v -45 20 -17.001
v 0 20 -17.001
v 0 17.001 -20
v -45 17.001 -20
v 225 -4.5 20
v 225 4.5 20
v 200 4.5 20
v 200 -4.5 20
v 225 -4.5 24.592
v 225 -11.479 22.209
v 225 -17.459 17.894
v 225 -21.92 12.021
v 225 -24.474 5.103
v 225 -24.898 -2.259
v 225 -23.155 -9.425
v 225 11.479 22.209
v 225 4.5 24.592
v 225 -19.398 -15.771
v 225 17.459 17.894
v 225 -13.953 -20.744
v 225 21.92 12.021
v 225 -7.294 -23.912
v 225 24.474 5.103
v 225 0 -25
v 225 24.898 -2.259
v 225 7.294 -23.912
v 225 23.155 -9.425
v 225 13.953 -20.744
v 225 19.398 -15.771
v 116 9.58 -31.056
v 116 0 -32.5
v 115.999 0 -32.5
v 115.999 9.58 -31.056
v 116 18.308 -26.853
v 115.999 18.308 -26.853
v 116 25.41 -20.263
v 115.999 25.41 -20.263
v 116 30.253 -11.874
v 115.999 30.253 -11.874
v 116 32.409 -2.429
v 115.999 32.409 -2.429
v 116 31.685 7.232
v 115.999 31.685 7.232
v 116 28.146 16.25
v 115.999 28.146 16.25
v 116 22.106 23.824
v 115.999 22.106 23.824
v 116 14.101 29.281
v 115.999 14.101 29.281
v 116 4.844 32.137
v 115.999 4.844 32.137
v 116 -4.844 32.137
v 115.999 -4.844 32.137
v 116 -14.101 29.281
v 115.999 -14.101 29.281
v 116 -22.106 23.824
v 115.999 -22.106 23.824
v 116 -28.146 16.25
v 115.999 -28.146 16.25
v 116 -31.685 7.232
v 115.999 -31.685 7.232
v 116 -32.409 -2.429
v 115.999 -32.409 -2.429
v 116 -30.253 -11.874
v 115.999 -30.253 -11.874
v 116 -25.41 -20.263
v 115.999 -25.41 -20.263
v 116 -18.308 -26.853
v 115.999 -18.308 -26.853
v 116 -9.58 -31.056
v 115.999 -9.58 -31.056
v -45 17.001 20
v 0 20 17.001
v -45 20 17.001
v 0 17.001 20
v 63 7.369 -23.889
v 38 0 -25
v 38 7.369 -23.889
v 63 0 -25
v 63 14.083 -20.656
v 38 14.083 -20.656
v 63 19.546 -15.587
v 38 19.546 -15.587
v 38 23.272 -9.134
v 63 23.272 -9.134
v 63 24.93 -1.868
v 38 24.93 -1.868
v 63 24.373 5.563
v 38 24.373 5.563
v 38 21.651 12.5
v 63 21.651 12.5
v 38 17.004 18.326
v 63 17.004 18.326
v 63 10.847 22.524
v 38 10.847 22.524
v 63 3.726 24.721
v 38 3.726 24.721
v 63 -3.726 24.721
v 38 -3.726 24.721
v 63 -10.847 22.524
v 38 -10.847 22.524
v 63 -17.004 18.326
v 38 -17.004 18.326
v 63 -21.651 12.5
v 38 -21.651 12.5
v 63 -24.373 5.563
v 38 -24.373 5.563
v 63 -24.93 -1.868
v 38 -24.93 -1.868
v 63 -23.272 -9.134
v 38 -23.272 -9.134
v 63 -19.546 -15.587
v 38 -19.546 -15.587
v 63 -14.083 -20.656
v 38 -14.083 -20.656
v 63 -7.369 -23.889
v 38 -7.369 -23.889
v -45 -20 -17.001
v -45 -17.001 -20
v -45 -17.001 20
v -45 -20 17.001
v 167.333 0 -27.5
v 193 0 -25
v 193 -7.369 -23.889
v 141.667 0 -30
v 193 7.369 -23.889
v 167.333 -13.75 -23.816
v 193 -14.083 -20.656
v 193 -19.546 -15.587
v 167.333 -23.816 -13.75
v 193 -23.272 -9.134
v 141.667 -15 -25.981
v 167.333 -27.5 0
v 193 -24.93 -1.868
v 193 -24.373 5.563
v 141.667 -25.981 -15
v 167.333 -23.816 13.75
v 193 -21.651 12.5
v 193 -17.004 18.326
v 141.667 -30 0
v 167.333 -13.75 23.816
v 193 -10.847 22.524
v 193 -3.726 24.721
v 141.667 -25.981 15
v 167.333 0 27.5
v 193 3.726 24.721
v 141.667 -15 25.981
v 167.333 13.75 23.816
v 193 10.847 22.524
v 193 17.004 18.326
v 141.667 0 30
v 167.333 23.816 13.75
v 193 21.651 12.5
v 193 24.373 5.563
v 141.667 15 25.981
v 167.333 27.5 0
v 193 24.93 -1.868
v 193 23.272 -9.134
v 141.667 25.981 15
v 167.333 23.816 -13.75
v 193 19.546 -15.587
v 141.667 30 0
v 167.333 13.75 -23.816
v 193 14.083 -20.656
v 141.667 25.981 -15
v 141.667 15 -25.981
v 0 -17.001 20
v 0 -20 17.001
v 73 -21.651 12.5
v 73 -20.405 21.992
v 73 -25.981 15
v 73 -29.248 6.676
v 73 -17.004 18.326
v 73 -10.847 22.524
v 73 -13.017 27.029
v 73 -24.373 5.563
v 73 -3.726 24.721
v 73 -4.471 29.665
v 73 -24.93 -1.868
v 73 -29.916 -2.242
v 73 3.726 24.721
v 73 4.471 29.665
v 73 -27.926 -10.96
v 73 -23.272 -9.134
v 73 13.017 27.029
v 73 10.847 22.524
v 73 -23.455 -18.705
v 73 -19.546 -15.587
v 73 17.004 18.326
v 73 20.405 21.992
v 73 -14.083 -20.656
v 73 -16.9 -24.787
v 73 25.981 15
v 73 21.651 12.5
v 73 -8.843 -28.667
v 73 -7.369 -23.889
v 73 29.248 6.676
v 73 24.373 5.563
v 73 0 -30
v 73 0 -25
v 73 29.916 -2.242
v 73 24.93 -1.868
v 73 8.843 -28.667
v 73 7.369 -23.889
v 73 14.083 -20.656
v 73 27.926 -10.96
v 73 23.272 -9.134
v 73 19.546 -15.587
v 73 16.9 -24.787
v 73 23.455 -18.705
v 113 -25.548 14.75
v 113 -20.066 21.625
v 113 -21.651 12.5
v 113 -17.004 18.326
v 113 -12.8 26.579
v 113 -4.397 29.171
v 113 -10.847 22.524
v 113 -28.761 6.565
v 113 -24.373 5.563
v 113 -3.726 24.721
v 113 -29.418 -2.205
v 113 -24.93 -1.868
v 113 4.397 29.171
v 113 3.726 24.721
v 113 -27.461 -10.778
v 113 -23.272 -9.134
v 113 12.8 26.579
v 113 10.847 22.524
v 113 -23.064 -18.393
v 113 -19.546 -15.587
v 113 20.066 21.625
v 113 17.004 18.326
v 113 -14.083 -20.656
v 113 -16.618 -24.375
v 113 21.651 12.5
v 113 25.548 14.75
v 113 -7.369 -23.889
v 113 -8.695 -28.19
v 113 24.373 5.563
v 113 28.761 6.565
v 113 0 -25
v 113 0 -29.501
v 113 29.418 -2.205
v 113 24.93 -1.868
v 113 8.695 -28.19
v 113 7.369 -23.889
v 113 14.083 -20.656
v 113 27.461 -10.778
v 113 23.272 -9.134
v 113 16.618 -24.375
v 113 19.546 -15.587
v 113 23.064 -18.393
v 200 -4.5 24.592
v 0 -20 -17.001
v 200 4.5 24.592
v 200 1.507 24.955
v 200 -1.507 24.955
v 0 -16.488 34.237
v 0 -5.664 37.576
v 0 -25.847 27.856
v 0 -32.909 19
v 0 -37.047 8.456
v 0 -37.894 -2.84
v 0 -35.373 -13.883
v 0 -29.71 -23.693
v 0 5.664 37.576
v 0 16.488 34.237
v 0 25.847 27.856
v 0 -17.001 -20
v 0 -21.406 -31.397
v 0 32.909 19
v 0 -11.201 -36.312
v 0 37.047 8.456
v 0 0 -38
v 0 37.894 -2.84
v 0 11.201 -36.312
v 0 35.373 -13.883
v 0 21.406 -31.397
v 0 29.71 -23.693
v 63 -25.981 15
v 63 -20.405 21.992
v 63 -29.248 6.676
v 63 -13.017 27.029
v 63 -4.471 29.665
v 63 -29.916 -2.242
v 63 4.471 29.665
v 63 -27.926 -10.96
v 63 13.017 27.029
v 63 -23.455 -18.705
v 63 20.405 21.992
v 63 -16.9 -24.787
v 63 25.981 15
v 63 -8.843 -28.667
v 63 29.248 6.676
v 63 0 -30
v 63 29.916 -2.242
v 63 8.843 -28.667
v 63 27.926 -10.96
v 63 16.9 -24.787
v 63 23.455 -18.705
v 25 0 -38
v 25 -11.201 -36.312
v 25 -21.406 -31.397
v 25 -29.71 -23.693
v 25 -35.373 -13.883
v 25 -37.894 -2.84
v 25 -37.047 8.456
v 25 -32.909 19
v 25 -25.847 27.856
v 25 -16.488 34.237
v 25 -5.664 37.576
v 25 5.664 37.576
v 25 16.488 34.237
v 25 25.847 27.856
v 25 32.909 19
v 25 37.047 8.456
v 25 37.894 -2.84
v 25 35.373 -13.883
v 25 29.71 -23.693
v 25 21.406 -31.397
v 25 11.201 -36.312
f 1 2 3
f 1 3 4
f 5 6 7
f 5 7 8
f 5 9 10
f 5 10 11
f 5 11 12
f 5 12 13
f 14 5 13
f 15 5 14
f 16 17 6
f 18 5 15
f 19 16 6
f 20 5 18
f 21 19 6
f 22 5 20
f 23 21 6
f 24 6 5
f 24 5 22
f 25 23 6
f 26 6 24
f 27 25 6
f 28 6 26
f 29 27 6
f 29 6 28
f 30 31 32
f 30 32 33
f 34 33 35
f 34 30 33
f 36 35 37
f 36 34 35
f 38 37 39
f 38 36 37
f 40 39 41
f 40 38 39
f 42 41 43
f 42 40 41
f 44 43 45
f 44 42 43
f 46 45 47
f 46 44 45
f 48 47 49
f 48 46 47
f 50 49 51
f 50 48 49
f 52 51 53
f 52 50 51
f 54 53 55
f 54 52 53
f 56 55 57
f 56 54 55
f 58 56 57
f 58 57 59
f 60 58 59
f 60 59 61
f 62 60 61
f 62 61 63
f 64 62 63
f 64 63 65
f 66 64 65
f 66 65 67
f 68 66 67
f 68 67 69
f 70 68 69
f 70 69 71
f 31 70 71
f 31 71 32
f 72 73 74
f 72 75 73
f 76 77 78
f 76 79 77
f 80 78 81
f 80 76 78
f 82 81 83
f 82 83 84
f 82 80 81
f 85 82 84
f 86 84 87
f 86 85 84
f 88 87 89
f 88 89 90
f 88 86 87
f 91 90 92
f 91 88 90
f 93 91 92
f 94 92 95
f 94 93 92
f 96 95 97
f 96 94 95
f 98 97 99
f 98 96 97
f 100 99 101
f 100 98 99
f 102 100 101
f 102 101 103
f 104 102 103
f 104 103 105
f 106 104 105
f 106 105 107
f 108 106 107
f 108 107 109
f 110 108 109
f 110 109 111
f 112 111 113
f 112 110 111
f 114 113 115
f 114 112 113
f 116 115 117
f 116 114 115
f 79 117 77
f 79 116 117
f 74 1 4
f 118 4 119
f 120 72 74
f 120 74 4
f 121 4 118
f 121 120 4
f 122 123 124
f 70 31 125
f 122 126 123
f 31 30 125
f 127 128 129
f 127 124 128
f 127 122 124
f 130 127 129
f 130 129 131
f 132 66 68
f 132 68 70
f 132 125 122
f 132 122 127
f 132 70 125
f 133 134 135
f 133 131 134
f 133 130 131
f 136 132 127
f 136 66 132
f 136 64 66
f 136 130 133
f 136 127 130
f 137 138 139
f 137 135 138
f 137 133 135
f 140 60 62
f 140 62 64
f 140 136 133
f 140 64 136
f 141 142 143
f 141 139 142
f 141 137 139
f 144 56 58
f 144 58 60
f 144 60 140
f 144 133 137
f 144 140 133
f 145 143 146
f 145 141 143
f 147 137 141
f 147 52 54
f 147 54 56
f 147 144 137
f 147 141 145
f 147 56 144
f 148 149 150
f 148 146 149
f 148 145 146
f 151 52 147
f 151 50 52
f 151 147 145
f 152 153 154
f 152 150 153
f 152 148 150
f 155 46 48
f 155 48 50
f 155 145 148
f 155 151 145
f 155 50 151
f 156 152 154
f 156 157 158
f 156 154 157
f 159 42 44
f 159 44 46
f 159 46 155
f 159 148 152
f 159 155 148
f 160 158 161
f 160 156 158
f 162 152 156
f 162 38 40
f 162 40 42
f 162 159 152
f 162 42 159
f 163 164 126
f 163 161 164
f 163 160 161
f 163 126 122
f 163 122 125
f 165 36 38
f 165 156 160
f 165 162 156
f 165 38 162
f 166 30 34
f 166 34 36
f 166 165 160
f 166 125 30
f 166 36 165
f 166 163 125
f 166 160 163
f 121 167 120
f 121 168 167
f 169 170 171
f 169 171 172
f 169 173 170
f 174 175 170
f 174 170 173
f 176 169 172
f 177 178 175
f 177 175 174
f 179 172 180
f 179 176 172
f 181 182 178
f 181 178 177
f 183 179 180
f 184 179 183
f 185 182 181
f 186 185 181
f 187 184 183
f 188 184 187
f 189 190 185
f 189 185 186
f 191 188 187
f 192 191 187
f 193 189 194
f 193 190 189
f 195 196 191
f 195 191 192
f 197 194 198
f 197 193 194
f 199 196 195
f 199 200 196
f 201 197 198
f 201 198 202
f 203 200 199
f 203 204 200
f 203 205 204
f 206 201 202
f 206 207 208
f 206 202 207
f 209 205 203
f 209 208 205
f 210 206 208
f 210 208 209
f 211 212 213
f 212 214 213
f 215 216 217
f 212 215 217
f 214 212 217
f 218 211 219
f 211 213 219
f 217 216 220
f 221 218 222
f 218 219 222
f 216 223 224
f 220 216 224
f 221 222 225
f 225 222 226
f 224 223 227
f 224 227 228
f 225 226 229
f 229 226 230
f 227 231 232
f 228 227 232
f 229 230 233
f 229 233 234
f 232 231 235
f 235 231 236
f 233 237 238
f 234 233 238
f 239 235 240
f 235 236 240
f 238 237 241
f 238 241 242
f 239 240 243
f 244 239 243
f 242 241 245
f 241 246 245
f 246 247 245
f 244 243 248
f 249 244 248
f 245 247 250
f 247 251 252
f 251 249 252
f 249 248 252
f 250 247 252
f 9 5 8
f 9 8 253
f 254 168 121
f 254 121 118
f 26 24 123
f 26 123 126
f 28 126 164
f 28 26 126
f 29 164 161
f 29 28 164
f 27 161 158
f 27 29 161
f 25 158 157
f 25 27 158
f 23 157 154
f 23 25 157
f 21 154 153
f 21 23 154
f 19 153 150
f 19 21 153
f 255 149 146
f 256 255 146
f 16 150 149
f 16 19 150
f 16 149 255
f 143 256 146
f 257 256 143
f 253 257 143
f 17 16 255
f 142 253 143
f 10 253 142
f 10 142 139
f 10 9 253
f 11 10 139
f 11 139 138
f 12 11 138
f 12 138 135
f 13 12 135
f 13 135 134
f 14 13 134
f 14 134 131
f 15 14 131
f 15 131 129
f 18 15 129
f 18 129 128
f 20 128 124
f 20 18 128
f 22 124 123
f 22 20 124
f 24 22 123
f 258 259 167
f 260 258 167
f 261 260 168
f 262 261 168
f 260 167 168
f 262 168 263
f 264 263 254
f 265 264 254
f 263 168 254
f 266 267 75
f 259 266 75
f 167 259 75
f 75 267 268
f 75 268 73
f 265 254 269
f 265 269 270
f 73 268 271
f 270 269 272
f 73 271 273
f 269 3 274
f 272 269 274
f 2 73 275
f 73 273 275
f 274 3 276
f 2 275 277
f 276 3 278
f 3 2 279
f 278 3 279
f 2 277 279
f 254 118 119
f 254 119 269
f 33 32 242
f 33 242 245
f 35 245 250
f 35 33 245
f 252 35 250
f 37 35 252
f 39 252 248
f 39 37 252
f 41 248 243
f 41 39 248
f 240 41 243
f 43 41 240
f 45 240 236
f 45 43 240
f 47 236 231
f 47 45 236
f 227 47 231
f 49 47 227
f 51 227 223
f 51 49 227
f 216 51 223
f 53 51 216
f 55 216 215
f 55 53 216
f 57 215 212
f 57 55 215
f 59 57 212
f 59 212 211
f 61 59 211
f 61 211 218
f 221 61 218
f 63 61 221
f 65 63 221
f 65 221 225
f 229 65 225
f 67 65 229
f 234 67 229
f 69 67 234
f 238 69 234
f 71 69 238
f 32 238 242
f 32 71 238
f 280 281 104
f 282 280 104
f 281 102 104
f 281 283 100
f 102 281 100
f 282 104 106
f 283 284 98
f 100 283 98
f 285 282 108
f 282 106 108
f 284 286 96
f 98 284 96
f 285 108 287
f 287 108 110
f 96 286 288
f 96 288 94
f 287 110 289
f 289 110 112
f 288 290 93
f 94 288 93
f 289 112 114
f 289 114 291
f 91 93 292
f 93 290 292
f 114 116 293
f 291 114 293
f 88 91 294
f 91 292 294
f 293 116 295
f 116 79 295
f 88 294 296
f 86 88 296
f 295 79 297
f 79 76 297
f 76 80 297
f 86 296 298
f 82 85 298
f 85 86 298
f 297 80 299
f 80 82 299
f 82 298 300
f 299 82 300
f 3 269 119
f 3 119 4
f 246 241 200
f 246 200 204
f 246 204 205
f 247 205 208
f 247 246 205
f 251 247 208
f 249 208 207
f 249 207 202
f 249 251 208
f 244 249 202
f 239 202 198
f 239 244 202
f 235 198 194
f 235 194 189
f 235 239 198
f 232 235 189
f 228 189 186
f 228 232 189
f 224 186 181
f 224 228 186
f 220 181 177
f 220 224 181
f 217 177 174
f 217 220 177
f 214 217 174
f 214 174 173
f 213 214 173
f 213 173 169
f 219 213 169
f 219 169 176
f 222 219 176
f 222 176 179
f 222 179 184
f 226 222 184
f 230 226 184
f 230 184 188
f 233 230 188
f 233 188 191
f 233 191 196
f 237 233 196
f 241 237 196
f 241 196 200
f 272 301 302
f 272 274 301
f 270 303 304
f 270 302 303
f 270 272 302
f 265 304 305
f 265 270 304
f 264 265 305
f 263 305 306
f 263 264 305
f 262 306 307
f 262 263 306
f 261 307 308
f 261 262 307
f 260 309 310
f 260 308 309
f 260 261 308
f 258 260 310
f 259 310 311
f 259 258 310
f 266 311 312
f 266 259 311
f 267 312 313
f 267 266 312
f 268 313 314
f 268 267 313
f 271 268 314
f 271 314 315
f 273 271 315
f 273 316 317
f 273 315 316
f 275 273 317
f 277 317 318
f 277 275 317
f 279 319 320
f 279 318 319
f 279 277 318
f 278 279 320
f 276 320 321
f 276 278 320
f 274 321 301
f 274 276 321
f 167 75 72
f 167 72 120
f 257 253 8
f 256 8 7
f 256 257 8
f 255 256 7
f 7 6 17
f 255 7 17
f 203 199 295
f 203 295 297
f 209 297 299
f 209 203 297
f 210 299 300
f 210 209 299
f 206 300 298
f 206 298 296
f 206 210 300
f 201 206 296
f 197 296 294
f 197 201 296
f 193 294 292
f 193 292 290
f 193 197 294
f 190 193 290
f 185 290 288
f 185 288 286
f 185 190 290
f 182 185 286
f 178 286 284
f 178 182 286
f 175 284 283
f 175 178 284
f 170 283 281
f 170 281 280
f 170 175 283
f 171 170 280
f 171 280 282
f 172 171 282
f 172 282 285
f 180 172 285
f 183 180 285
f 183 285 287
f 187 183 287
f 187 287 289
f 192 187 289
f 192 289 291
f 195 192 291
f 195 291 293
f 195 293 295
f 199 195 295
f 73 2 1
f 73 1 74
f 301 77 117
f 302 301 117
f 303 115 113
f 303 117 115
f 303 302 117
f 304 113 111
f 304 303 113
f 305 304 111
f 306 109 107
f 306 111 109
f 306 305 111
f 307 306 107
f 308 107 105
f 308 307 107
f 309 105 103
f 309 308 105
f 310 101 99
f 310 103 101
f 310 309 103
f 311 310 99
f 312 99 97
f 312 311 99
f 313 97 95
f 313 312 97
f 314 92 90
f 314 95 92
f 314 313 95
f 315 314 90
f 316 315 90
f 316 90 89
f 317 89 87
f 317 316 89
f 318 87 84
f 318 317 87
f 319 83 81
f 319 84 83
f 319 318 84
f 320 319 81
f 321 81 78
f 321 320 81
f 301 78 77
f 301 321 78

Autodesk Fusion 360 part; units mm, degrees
sketch "Sketch1" plane through (0, 0, 0) normal (0, 1, 0) x (1, 0, 0) in component "Shaft"
  line L0 (0, 0) -> (25, 0)
  line L1 (25, 38) -> (0, 38)
  line L2 (0, 38) -> (0, 0)
  line L3 (25, 38) -> (38, 25)
  line L4 (38, 25) -> (63, 25)
  line L5 (63, 25) -> (63, 30)
  line L6 (63, 30) -> (73, 30)
  line L7 (73, 30) -> (73, 25)
  line L8 (73, 25) -> (113, 25)
  line L9 (113, 25) -> (113, 32.5)
  line L10 (113, 32.5) -> (116, 32.5)
  line L11 (0, 0) -> (193, 0)
  line L12 (116, 32.5) -> (193, 25)
  line L13 (193, 25) -> (225, 25)
  line L14 (225, 25) -> (225, 0)
  line L15 (225, 0) -> (193, 0)
  dimension "d2" = 25
  dimension "d3" = 38
  dimension "d8" = 25
  dimension "d9" = 5
  dimension "d10" = 10
  dimension "d11" = 5
  dimension "d12" = 13
  dimension "d13" = 40
  dimension "d15" = 3
  dimension "d17" = 25
  dimension "d18" = 32
revolve "Revolve1" add sketch "Sketch1" angle 360 about axis through (0, 0, 0) along (1, 0, 0) in component "Shaft"
sketch "Sketch2" plane through (0, 0, 0) normal (-1, 0, 0) x (0, -1, 0) in component "Shaft"
  circle A0 centre (0, 0) radius 38
  line L0 (20, -20) -> (-20, -20)
  line L1 (-20, -20) -> (-20, 20)
  line L2 (-20, 20) -> (20, 20)
  line L3 (20, 20) -> (20, -20)
  line L4 (20, -20) -> (-20, 20) construction
  line L5 (-20, -20) -> (20, 20) construction
  dimension "d20" = 40
  dimension "d21" = 40
extrude "Extrude1" add sketch "Sketch2" along normal blind 45 contours L0 L1 L2 L3 in component "Shaft"
sketch "Sketch3" plane through (225, 0, 0) normal (1, 0, 0) x (0, 1, 0) in component "Shaft"
  circle A0 centre (0, 0) radius 25
  circle A1 centre (0, 0) radius 25
  line L0 (4.5, 20) -> (-4.5, 20)
  arc A2 (4.5, 24.5917) -> (-4.5, 24.5917) centre (0, 0) ccw
  line L1 (4.5, 20) -> (4.5, 24.5917)
  line L2 (-4.5, 20) -> (-4.5, 24.5917)
extrude "Extrude2" cut sketch "Sketch3" against normal blind 25 contours A0 A1 L0 A2 L1 L2 in component "Shaft"
chamfer "Chamfer1" distance 3 angle 45 5 edges at (-22.5, -20, 20) (-22.5, 20, 20) (-22.5, -20, -20) (-22.5, 20, -20) (113, -11.7525, 30.3006) in component "Shaft"
component "Shaft" placed x (1, 0, 0) y (0, 1, 0) z (0, 0, 1) at (0, 0, 0)
